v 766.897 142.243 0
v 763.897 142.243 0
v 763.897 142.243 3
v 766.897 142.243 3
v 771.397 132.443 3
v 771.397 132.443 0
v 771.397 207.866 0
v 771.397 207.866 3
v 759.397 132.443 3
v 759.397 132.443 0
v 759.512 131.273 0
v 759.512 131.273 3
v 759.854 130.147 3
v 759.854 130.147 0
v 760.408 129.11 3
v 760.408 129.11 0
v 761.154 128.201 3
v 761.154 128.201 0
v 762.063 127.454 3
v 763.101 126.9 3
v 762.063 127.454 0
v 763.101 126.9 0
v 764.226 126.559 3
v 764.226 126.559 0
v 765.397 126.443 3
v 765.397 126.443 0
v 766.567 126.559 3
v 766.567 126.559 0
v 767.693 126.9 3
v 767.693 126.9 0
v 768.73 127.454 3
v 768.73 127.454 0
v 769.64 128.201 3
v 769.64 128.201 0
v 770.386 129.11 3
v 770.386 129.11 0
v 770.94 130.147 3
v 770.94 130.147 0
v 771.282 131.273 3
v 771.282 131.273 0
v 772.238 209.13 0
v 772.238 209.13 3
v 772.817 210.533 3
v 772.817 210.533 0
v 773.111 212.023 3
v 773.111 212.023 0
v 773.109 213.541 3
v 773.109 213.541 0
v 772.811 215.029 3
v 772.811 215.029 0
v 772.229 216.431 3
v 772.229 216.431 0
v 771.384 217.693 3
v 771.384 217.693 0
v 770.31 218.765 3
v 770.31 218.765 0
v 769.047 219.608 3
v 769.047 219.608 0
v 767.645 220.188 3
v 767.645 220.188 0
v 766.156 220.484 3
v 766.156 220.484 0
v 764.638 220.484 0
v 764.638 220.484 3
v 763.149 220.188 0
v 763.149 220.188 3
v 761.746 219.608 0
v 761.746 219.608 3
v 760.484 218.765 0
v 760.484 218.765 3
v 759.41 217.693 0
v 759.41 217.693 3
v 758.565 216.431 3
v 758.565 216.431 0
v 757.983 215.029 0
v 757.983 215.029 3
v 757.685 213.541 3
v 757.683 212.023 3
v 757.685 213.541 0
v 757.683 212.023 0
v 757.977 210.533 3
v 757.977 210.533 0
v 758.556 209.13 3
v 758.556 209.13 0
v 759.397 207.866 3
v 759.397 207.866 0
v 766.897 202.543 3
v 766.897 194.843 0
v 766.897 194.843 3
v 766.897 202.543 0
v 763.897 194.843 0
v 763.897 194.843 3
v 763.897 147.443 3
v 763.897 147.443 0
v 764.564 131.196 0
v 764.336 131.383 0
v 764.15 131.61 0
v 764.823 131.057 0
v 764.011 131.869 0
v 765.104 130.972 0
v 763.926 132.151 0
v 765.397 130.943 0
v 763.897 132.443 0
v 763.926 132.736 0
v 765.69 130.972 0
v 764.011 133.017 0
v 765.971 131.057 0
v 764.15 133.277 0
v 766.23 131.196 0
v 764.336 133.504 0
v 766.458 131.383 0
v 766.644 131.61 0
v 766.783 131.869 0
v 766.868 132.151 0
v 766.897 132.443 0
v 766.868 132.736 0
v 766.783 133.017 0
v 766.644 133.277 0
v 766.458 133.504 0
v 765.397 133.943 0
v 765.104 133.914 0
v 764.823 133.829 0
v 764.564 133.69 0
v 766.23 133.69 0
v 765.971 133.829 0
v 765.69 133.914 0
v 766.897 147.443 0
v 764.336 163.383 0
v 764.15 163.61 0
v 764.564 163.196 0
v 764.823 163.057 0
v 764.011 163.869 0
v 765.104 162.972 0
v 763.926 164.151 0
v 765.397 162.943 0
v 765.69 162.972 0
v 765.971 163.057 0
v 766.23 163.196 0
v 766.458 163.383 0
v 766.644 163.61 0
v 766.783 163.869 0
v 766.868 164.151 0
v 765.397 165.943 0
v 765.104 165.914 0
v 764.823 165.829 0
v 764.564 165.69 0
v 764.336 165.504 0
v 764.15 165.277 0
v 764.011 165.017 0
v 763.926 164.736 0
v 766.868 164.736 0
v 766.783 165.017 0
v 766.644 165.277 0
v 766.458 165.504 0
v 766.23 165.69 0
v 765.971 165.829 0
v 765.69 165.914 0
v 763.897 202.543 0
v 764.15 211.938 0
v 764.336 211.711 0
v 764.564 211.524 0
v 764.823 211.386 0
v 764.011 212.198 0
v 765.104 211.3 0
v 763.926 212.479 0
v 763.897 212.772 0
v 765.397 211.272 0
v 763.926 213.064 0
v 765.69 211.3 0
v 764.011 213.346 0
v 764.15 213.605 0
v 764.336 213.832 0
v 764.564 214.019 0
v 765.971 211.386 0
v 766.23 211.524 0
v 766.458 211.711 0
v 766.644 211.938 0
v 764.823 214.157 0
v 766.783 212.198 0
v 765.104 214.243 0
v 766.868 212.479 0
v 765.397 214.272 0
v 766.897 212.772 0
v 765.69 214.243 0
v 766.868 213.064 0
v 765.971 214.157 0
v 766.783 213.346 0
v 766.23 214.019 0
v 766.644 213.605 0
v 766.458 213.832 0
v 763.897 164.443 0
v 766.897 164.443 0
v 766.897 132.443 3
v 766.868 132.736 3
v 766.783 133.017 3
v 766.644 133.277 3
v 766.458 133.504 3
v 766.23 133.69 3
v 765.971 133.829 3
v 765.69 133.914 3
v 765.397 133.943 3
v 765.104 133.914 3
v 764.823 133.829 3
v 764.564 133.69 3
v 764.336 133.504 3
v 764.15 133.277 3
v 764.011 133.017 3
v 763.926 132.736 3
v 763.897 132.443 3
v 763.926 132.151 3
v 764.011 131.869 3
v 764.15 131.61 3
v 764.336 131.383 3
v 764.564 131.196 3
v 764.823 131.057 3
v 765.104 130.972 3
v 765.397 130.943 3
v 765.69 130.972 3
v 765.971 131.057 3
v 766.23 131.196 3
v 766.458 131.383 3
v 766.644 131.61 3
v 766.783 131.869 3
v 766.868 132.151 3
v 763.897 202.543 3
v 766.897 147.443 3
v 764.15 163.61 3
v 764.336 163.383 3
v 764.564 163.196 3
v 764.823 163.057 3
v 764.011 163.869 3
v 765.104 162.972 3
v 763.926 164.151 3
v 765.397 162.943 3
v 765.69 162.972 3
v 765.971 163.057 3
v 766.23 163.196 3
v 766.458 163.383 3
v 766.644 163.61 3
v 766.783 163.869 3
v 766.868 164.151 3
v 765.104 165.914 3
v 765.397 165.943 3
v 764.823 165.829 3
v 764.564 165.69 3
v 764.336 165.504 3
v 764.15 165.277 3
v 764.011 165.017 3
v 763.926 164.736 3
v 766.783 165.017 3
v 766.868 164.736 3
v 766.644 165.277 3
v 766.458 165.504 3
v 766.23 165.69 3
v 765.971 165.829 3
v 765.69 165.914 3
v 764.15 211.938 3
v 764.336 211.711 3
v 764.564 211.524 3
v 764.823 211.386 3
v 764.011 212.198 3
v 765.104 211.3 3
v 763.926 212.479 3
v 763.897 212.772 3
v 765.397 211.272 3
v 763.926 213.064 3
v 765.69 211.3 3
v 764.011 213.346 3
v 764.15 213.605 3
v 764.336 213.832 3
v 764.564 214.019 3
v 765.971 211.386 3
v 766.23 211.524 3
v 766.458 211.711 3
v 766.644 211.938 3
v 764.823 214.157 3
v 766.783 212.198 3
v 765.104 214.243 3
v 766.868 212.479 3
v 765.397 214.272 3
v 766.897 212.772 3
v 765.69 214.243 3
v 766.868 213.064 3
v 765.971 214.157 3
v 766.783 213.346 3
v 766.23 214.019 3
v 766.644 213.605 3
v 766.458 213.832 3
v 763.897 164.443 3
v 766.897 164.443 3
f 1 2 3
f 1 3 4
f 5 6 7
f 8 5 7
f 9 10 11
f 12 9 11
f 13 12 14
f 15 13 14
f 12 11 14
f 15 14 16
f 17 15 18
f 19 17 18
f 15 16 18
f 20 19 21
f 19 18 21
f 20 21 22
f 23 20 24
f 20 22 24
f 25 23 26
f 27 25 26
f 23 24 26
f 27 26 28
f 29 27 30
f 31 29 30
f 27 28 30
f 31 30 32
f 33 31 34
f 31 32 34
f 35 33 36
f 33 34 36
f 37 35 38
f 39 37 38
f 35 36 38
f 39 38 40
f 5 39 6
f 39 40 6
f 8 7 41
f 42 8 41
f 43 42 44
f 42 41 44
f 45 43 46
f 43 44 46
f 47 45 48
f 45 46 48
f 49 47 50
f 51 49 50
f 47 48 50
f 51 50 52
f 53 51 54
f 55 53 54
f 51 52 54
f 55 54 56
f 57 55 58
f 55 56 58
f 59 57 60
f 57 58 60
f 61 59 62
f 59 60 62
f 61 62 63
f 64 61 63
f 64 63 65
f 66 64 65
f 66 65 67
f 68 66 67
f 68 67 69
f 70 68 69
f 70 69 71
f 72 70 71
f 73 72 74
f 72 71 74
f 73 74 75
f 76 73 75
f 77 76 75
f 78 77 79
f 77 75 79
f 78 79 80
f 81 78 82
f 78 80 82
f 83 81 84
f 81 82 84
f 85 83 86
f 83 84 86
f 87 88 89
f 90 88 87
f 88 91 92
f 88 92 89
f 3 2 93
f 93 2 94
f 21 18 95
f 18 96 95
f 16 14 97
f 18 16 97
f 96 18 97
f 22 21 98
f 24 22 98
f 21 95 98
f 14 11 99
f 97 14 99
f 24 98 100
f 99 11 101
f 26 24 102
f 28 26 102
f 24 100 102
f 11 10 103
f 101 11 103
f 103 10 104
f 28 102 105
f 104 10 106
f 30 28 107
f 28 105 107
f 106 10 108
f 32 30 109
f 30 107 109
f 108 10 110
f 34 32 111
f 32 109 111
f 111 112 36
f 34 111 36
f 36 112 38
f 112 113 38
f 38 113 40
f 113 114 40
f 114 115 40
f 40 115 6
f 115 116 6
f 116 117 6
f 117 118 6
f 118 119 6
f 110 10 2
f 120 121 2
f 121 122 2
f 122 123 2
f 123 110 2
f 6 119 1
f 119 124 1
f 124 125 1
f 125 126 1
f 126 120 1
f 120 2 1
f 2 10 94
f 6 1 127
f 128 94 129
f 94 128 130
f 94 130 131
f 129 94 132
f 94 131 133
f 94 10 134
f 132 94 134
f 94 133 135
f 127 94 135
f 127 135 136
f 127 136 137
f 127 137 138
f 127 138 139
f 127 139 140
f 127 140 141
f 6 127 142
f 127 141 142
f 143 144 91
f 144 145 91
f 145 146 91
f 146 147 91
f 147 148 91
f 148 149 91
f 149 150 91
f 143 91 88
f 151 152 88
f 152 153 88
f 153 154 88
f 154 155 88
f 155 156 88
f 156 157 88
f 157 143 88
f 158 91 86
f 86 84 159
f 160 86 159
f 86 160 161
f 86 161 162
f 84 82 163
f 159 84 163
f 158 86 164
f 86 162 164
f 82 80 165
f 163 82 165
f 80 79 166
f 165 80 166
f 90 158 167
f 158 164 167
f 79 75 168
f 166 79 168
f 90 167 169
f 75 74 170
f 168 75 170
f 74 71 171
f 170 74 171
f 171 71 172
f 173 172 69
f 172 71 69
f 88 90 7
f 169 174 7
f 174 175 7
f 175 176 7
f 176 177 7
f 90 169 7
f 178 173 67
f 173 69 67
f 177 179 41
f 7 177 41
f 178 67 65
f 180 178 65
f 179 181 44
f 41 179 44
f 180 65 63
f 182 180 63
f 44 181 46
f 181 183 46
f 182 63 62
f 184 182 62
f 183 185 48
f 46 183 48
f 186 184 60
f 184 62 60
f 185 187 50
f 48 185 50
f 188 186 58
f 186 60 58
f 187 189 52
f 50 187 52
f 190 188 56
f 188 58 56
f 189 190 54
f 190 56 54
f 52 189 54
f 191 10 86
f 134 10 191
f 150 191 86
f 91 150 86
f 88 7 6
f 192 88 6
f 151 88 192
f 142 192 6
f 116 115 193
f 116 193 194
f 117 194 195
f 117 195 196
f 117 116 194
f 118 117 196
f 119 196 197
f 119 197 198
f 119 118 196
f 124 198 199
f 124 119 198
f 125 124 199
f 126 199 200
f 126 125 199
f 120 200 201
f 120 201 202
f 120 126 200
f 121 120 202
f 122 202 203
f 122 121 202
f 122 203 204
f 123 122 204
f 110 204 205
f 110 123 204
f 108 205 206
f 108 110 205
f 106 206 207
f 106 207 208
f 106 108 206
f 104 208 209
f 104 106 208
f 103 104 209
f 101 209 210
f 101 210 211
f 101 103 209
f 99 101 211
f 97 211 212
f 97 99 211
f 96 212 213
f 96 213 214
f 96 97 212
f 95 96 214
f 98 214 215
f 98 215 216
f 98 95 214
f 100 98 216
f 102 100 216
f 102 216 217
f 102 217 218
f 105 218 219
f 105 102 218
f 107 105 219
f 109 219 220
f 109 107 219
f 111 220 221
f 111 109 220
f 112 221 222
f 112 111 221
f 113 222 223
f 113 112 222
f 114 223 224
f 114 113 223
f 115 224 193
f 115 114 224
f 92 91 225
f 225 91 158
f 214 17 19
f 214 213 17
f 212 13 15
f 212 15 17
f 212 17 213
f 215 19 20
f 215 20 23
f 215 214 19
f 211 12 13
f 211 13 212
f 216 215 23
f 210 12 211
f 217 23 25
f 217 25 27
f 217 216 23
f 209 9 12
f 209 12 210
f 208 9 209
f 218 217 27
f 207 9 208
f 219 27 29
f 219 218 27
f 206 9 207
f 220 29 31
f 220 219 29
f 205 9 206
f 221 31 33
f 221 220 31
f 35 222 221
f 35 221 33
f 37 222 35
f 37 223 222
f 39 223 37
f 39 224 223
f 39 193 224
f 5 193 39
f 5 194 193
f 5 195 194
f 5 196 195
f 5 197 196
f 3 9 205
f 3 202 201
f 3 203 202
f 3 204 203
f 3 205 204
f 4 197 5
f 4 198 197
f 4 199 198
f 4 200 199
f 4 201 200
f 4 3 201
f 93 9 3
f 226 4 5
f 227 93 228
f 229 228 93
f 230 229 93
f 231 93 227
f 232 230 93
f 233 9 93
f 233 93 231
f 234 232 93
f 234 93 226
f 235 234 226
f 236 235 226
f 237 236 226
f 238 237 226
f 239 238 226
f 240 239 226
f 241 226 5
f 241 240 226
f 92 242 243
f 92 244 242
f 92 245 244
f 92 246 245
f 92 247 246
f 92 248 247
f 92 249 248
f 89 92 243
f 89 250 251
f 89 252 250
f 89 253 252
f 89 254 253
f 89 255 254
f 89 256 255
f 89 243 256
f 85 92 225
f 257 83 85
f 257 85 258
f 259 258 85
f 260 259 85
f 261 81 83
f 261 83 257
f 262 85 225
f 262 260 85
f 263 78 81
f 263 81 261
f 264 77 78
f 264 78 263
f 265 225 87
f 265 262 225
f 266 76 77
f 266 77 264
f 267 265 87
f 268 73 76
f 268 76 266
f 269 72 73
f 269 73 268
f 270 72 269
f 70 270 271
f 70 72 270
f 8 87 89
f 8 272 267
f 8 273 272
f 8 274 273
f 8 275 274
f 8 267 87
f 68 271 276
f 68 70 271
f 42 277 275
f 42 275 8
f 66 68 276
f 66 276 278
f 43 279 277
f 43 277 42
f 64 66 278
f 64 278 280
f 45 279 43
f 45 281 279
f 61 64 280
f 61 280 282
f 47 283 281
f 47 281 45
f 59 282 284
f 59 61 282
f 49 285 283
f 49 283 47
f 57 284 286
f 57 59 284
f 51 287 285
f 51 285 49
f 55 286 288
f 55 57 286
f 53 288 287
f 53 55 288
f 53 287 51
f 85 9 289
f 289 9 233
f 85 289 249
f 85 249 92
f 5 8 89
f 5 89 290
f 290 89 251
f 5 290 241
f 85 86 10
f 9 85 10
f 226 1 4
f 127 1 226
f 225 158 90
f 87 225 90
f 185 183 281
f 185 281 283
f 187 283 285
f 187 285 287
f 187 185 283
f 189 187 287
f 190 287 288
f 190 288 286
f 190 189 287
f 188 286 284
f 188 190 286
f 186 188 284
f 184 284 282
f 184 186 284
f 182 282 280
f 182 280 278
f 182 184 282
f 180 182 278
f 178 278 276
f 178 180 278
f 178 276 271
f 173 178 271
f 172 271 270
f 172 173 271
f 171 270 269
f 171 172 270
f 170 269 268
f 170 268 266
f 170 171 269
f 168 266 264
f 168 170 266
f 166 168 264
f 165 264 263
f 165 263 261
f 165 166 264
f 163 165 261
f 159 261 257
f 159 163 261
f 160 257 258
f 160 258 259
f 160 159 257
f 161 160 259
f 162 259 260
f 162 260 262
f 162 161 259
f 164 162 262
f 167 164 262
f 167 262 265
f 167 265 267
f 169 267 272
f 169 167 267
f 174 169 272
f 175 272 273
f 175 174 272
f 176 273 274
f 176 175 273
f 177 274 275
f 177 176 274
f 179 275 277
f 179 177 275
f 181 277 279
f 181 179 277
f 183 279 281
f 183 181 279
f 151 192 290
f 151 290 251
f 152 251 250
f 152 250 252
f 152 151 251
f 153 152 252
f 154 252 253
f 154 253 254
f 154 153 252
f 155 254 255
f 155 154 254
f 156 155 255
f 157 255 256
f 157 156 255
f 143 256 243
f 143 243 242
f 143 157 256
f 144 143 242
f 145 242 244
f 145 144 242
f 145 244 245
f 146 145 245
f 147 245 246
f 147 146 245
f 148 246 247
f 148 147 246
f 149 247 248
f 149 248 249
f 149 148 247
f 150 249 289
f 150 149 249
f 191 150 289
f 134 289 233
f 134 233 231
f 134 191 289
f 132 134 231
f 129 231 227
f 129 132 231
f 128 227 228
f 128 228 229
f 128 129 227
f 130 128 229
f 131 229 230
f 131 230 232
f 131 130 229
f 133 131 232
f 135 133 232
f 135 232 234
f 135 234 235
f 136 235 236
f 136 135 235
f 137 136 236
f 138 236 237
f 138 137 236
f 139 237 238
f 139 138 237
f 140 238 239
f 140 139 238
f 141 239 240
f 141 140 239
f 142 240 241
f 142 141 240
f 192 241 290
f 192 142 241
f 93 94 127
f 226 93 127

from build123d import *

# Parameters (mm, degrees)
ESQUISSE1_W        = 3
ESQUISSE1_H        = 5.2
ESQUISSE1_R        = 1.5
ESQUISSE1_H_2      = 7.7
BOSS_EXTRU_1_DEPTH = 3


with BuildPart() as part:
    # Esquisse1 → Boss.-Extru.1 (new body)
    with BuildSketch(Plane.XY):
        with BuildLine():
            ThreePointArc((771.396898563, 207.86630439), (765.396898563, 220.521658607), (759.396898563, 207.86630439))
            Line((759.396898563, 207.86630439), (759.396898563, 132.443292949))
            ThreePointArc((759.396898563, 132.443292949), (765.396898563, 126.443292949), (771.396898563, 132.443292949))
            Line((771.396898563, 132.443292949), (771.396898563, 207.86630439))
        make_face()
        with Locations((765.396898563, 144.843292949)):
            Rectangle(ESQUISSE1_W, ESQUISSE1_H, mode=Mode.SUBTRACT)
        with Locations((765.396898563, 132.443292949)):
            Circle(ESQUISSE1_R, mode=Mode.SUBTRACT)
        with Locations((765.396898563, 164.443292949)):
            Circle(ESQUISSE1_R, mode=Mode.SUBTRACT)
        with Locations((765.396898563, 198.693292949)):
            Rectangle(ESQUISSE1_W, ESQUISSE1_H_2, mode=Mode.SUBTRACT)
        with Locations((765.396898563, 212.771658607)):
            Circle(ESQUISSE1_R, mode=Mode.SUBTRACT)
    extrude(amount=BOSS_EXTRU_1_DEPTH)


solid = part.part
